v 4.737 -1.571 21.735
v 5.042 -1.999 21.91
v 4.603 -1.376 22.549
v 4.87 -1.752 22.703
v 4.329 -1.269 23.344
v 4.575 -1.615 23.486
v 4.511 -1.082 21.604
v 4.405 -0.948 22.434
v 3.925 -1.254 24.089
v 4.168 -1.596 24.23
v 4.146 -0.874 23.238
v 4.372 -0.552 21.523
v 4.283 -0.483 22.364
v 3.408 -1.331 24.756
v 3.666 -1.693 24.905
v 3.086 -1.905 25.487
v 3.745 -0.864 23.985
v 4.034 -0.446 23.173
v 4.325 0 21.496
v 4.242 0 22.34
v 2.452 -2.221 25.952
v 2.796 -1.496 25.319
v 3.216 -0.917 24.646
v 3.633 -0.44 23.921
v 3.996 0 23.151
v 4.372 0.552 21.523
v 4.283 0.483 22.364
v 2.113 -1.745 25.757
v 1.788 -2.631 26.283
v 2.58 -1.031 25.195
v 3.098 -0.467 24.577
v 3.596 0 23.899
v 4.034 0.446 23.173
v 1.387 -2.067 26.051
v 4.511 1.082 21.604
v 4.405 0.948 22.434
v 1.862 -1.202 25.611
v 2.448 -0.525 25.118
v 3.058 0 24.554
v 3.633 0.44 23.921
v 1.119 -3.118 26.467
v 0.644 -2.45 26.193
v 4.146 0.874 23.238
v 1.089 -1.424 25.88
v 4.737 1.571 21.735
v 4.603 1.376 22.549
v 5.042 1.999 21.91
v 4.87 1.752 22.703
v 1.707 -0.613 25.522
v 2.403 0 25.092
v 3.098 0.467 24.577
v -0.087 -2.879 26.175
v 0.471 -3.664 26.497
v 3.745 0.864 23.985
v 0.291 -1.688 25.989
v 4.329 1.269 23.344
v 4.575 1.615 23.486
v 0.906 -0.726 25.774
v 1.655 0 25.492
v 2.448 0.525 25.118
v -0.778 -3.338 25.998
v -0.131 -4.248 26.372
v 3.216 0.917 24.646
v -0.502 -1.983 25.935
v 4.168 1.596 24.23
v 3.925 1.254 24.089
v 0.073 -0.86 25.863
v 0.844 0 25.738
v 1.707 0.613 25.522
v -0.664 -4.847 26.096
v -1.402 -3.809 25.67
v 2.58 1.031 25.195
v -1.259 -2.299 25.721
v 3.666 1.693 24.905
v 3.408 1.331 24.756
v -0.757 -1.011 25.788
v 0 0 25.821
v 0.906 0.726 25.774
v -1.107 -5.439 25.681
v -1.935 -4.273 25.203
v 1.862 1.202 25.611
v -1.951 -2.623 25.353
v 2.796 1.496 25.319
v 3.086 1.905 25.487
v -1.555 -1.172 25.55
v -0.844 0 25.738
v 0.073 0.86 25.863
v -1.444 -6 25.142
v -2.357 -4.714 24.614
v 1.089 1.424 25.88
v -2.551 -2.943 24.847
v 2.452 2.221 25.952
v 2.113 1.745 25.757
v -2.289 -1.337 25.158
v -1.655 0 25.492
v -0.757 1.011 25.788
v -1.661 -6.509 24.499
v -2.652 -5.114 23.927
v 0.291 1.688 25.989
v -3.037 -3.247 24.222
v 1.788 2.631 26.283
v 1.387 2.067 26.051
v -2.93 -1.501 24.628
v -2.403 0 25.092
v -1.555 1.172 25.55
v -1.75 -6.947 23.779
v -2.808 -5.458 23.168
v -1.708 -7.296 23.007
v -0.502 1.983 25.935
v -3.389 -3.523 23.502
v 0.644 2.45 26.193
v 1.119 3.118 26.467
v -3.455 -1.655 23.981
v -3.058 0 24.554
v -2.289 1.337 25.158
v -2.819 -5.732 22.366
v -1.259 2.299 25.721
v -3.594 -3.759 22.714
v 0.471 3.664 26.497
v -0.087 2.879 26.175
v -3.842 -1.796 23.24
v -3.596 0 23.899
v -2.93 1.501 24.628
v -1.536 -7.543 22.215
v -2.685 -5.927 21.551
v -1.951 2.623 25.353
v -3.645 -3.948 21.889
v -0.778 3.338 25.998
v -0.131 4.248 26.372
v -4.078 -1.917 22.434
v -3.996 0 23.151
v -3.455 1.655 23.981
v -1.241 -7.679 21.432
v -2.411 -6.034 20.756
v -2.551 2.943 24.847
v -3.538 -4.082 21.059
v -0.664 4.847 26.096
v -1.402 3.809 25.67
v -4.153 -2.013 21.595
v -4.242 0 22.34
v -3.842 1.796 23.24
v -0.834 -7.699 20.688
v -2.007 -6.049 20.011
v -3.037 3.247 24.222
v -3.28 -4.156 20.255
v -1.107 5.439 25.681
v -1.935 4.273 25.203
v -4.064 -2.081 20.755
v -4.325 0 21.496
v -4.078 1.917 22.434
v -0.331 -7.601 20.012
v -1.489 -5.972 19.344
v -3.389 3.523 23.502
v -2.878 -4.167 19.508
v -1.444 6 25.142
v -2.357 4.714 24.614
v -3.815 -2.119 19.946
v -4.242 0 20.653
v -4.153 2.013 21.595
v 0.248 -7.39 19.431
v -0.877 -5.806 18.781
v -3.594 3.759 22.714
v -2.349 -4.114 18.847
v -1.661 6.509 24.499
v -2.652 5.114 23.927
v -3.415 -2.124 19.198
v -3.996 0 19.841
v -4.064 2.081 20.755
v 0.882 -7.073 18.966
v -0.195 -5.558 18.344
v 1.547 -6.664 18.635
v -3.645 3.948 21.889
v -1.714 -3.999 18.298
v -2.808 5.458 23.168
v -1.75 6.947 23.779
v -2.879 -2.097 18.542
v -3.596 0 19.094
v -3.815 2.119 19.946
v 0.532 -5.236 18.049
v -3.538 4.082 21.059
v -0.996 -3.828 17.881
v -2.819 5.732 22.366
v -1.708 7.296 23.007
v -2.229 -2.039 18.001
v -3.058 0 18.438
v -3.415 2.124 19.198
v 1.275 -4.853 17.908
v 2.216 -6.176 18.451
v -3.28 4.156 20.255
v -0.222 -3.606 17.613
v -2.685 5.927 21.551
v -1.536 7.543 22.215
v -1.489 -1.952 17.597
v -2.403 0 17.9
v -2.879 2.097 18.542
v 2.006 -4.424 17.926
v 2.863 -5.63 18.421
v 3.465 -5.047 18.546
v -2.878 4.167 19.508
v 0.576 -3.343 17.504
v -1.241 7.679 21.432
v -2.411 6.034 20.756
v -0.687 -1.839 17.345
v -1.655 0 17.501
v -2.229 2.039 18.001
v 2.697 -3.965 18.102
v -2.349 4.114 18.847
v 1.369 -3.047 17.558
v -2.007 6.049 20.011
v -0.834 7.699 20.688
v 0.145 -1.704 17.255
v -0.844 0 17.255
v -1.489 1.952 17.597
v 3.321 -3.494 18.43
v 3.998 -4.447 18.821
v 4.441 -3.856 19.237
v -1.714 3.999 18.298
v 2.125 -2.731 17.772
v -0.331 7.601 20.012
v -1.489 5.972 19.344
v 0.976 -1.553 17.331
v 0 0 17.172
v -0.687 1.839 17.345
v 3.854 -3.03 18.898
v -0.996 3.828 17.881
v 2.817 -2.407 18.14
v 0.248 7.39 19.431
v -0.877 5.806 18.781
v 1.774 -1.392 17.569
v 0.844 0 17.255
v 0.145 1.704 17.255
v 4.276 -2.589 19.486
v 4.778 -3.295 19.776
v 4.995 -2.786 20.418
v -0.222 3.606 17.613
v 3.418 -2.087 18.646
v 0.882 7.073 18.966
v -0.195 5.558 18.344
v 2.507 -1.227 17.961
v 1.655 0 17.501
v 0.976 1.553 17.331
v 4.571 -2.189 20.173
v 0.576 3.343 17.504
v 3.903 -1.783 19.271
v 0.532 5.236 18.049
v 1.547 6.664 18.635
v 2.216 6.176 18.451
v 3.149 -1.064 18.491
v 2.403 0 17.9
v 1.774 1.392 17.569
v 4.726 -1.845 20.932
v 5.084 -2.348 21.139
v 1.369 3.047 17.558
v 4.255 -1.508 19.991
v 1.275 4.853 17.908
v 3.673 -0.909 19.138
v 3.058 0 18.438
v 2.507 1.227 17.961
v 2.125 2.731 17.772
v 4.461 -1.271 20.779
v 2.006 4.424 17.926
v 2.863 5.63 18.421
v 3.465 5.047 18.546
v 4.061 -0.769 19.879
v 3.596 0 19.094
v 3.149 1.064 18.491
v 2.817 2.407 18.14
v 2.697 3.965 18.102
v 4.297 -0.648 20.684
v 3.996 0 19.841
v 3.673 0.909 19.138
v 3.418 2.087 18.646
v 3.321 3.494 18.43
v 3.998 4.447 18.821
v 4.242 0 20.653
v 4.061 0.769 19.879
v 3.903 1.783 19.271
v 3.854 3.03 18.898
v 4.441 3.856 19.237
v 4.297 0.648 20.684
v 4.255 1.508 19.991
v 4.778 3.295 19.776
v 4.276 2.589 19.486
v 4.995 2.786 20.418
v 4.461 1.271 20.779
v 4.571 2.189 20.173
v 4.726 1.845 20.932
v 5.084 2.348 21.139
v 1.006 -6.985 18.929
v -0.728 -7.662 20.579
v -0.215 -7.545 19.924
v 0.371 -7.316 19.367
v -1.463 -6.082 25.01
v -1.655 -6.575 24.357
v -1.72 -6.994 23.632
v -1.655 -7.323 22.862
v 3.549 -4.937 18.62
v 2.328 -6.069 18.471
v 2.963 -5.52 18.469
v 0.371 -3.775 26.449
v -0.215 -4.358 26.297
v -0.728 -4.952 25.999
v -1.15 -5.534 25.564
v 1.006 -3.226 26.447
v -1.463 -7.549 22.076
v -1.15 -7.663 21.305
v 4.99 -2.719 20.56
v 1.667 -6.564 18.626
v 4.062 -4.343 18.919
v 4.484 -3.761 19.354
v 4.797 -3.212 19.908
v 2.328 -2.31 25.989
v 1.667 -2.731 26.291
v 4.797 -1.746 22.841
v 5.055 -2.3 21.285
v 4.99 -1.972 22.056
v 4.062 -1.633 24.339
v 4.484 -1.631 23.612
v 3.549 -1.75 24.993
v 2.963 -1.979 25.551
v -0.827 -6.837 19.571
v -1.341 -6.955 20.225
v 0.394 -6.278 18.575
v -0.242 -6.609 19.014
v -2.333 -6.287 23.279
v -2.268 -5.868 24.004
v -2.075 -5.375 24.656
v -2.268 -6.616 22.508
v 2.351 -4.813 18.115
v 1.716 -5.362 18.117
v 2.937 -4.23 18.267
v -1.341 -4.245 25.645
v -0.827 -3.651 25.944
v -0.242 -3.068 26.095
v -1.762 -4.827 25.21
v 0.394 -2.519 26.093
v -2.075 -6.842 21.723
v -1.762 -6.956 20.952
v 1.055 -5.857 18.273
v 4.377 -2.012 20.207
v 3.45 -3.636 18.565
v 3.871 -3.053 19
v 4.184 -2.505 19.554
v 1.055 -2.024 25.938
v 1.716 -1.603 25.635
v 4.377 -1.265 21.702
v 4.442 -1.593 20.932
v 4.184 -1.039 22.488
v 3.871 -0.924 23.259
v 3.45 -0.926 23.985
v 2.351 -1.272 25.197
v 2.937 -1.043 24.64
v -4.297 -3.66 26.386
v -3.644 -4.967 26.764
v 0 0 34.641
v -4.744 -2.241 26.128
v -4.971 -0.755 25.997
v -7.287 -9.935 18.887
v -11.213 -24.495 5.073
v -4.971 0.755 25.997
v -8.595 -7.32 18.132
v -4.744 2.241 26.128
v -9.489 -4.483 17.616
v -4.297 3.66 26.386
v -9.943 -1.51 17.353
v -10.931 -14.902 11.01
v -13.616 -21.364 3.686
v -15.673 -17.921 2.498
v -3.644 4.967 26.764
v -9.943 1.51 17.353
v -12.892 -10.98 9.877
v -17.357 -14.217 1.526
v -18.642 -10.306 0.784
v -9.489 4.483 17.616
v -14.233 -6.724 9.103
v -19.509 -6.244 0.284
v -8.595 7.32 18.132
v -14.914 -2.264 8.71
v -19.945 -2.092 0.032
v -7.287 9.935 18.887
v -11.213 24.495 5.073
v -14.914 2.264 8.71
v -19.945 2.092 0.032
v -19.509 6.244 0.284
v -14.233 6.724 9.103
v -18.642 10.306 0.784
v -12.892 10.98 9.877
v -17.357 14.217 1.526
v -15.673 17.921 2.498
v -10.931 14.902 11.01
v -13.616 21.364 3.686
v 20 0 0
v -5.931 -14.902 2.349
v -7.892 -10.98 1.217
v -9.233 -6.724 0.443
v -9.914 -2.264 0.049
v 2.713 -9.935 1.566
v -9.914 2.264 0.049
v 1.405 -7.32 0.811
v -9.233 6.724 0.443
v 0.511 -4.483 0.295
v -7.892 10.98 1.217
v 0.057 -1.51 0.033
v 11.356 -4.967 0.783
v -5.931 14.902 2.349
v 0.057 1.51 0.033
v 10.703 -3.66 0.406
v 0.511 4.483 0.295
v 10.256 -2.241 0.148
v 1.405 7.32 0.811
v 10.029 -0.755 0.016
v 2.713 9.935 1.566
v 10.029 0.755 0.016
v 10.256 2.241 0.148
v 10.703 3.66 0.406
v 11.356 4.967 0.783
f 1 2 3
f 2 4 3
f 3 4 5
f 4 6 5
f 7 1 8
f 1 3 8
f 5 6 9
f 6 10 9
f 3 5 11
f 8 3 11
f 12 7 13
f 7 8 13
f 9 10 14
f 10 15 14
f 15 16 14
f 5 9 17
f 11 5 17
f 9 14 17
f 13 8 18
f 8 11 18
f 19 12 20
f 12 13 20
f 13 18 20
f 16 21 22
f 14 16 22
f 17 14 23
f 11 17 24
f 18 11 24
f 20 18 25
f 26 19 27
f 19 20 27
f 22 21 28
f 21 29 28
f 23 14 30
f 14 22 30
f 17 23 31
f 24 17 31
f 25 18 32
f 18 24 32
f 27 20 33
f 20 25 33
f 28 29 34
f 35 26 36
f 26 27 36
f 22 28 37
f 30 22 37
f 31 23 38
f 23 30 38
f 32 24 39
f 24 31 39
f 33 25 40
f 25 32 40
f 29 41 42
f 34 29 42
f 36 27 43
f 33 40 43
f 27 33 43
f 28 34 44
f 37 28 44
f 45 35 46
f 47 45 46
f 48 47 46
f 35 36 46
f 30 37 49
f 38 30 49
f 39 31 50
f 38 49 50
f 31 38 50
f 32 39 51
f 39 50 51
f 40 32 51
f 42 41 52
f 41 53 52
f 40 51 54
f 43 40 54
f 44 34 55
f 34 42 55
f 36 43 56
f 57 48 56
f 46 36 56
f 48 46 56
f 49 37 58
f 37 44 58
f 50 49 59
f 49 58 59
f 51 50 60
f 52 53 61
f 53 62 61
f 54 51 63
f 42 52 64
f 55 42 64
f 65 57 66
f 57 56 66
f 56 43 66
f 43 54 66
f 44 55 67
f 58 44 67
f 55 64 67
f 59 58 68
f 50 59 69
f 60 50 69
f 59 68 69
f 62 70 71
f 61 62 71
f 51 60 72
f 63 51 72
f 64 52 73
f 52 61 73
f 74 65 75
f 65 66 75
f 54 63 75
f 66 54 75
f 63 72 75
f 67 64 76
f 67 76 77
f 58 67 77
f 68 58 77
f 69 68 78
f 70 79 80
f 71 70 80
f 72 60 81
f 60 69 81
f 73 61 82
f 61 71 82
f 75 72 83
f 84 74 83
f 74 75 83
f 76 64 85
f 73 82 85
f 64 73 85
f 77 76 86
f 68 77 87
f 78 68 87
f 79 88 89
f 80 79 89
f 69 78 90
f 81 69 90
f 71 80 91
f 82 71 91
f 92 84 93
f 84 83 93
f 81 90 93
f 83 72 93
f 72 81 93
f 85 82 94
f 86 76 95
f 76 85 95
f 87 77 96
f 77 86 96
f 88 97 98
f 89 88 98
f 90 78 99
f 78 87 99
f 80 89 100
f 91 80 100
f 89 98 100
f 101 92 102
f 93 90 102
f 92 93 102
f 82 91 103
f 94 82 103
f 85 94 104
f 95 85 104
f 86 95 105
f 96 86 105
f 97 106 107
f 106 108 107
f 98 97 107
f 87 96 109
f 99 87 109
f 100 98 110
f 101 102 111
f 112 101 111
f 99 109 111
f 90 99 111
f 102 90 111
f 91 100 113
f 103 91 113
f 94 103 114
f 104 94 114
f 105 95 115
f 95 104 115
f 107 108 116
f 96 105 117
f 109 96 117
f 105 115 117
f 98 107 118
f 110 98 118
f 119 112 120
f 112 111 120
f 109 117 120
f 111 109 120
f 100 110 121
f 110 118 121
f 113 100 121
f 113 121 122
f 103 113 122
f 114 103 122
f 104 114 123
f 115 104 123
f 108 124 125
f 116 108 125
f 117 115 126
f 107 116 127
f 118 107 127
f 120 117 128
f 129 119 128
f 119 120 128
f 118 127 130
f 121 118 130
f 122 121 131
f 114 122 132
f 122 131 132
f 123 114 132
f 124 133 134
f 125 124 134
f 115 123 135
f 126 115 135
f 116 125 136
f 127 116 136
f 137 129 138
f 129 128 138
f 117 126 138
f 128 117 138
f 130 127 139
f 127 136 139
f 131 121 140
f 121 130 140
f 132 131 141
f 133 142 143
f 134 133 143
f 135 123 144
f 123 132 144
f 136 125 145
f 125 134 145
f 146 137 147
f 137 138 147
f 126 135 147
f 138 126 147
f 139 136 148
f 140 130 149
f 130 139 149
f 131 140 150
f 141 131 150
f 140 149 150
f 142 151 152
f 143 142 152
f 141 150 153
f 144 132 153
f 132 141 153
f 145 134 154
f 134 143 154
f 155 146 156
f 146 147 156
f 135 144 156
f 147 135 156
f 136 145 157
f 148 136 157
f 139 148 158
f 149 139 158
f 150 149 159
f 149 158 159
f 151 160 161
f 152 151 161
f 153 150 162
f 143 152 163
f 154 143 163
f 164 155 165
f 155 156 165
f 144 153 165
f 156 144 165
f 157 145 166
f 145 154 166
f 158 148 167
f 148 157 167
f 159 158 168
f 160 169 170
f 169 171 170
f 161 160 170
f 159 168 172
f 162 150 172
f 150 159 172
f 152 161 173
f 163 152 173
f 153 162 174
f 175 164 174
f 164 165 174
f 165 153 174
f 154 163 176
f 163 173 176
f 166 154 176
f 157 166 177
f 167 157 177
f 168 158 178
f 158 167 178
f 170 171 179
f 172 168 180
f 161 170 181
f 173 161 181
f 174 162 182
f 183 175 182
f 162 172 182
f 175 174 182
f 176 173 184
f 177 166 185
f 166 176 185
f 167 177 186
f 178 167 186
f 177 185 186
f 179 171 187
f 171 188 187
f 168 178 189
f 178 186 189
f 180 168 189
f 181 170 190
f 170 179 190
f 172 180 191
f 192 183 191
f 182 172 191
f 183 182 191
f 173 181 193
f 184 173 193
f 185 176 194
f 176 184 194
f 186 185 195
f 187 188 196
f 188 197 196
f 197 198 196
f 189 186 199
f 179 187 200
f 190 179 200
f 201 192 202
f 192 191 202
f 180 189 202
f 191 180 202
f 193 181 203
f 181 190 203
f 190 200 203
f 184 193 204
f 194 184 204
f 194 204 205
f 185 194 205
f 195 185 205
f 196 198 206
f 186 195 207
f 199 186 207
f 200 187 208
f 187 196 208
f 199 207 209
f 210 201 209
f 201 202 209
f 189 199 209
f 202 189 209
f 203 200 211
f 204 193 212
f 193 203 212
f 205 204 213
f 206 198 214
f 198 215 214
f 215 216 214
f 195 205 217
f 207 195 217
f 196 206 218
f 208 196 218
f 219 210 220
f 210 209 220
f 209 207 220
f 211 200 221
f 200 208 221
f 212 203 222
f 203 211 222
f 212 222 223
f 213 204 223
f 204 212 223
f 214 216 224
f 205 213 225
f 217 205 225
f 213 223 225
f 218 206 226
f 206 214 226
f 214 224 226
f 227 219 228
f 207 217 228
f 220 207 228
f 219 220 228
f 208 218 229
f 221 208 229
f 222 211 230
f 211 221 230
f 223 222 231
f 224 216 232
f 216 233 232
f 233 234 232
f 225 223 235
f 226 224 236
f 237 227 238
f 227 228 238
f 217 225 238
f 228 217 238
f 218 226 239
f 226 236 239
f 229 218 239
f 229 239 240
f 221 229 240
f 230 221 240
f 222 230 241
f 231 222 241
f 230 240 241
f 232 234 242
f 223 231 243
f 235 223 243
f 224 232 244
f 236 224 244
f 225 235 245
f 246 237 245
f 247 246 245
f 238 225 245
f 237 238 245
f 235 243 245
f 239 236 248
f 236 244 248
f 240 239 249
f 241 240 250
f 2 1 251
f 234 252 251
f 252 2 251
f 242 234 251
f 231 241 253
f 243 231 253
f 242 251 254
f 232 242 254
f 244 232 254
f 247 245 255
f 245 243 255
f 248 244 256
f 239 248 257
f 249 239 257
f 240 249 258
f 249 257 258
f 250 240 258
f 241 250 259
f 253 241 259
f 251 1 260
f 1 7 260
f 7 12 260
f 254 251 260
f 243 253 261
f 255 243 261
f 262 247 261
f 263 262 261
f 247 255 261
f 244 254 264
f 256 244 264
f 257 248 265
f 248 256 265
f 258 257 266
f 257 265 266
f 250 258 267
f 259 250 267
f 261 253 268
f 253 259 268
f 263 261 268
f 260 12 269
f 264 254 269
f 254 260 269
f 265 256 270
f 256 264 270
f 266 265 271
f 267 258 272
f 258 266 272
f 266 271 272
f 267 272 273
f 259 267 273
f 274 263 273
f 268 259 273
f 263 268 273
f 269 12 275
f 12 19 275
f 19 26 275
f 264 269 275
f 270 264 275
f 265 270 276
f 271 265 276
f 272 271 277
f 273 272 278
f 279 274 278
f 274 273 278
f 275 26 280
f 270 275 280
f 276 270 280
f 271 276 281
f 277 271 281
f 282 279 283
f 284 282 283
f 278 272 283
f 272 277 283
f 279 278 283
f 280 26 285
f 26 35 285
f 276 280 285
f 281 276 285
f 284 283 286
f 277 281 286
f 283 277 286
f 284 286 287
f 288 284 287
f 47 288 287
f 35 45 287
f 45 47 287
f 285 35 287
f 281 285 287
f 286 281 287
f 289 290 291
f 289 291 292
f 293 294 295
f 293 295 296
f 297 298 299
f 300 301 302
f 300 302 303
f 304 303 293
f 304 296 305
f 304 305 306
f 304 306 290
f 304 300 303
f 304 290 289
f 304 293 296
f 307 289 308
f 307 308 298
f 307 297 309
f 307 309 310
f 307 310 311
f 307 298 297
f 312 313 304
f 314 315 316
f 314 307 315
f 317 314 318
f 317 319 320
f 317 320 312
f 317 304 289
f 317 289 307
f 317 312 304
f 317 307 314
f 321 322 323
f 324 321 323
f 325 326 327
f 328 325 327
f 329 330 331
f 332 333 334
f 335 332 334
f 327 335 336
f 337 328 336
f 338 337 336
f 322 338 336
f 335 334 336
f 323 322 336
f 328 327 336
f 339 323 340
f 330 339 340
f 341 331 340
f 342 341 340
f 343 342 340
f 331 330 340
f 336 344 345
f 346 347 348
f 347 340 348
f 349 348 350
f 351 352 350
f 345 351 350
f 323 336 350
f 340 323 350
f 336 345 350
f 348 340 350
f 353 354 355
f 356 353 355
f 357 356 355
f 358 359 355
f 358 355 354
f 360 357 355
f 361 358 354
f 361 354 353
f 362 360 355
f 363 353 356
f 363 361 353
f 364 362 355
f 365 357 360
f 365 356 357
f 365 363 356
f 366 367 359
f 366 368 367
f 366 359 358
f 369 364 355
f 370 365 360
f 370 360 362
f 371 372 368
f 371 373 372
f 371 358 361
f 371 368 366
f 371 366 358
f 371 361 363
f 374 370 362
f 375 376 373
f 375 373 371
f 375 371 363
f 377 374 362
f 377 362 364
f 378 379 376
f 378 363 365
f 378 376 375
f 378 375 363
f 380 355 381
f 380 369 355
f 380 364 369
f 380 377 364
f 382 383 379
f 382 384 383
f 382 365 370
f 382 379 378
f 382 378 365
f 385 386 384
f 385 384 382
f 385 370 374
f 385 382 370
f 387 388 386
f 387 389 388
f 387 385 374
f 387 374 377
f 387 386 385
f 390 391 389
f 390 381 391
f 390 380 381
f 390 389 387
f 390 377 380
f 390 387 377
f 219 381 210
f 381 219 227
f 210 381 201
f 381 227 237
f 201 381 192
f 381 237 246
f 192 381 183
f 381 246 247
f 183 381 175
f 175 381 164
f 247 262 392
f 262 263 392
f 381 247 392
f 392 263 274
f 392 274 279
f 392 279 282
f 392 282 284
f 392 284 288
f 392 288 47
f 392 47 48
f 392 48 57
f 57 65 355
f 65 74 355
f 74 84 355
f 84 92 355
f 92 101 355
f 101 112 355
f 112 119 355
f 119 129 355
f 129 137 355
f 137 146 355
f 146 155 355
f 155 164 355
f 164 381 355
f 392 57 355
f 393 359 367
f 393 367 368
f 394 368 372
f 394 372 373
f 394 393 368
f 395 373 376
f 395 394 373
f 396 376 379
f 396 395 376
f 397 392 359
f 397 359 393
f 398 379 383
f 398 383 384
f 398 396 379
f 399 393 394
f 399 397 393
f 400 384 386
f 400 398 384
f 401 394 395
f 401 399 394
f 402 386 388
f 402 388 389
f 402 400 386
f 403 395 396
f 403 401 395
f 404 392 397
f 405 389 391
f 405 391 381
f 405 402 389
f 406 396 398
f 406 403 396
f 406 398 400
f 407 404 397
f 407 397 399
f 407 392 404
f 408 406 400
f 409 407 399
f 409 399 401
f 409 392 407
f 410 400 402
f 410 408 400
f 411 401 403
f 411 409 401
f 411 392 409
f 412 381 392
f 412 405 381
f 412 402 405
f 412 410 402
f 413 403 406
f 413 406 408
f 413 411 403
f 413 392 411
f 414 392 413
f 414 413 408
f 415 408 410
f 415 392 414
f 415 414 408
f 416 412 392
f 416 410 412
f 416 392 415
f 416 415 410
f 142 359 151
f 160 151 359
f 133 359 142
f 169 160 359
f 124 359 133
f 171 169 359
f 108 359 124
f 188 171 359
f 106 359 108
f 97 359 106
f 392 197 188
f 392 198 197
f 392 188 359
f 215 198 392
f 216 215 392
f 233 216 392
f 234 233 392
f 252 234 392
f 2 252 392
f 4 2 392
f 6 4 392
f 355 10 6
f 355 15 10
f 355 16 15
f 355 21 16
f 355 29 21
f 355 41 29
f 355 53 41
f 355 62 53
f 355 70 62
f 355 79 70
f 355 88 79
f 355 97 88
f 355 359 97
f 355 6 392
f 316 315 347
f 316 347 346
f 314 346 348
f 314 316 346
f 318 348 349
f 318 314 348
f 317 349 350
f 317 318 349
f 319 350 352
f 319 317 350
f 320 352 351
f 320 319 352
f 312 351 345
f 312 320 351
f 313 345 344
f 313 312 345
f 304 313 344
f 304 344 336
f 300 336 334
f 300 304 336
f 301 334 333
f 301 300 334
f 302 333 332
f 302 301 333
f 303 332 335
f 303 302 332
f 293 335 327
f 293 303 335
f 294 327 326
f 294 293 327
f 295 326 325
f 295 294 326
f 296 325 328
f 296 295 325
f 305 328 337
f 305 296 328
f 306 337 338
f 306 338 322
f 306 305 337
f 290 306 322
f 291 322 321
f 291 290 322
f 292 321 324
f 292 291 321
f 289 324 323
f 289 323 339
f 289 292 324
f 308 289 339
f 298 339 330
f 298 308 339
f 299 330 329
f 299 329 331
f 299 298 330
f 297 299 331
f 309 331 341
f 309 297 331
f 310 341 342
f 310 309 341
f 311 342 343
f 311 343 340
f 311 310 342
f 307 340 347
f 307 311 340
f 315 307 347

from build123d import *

# Parameters (mm, degrees)
F0_R          = 4.3247644879
F1_ANGLE_BACK = 45
F1_ANGLE      = 90
F2_R          = 4.2849013553
F3_DEPTH      = 1


with BuildPart() as f1:
    # F0 (on Front) → F1 (revolve)
    with BuildSketch(Plane.XZ, mode=Mode.PRIVATE) as f1_sk:
        Polygon((0, 0), (20, 0), (0, 34.6410161514), (-20, 0), align=None)
        with Locations((0, 21.496295929)):
            Circle(F0_R, mode=Mode.SUBTRACT)
    revolve(f1_sk.sketch.rotate(Axis((10, 0, 17.3205080757), (0.5, 0, -0.8660254038)), -F1_ANGLE_BACK), axis=Axis((10, 0, 17.3205080757), (0.5, 0, -0.8660254038)), revolution_arc=F1_ANGLE)


with BuildPart() as f3:
    # F2 (on face) → F3 (new body)
    with BuildSketch(Plane(origin=(7.5, -8.6602540378, 4.3301270189), x_dir=(0.790569415, 0.5477225575, -0.2738612788), z_dir=(0.6123724357, -0.7071067812, 0.3535533906))):
        with Locations((-7.3781014538, 18.00939487)):
            Circle(F2_R)
    extrude(amount=-F3_DEPTH)


solid = Compound([f1.part, f3.part])
